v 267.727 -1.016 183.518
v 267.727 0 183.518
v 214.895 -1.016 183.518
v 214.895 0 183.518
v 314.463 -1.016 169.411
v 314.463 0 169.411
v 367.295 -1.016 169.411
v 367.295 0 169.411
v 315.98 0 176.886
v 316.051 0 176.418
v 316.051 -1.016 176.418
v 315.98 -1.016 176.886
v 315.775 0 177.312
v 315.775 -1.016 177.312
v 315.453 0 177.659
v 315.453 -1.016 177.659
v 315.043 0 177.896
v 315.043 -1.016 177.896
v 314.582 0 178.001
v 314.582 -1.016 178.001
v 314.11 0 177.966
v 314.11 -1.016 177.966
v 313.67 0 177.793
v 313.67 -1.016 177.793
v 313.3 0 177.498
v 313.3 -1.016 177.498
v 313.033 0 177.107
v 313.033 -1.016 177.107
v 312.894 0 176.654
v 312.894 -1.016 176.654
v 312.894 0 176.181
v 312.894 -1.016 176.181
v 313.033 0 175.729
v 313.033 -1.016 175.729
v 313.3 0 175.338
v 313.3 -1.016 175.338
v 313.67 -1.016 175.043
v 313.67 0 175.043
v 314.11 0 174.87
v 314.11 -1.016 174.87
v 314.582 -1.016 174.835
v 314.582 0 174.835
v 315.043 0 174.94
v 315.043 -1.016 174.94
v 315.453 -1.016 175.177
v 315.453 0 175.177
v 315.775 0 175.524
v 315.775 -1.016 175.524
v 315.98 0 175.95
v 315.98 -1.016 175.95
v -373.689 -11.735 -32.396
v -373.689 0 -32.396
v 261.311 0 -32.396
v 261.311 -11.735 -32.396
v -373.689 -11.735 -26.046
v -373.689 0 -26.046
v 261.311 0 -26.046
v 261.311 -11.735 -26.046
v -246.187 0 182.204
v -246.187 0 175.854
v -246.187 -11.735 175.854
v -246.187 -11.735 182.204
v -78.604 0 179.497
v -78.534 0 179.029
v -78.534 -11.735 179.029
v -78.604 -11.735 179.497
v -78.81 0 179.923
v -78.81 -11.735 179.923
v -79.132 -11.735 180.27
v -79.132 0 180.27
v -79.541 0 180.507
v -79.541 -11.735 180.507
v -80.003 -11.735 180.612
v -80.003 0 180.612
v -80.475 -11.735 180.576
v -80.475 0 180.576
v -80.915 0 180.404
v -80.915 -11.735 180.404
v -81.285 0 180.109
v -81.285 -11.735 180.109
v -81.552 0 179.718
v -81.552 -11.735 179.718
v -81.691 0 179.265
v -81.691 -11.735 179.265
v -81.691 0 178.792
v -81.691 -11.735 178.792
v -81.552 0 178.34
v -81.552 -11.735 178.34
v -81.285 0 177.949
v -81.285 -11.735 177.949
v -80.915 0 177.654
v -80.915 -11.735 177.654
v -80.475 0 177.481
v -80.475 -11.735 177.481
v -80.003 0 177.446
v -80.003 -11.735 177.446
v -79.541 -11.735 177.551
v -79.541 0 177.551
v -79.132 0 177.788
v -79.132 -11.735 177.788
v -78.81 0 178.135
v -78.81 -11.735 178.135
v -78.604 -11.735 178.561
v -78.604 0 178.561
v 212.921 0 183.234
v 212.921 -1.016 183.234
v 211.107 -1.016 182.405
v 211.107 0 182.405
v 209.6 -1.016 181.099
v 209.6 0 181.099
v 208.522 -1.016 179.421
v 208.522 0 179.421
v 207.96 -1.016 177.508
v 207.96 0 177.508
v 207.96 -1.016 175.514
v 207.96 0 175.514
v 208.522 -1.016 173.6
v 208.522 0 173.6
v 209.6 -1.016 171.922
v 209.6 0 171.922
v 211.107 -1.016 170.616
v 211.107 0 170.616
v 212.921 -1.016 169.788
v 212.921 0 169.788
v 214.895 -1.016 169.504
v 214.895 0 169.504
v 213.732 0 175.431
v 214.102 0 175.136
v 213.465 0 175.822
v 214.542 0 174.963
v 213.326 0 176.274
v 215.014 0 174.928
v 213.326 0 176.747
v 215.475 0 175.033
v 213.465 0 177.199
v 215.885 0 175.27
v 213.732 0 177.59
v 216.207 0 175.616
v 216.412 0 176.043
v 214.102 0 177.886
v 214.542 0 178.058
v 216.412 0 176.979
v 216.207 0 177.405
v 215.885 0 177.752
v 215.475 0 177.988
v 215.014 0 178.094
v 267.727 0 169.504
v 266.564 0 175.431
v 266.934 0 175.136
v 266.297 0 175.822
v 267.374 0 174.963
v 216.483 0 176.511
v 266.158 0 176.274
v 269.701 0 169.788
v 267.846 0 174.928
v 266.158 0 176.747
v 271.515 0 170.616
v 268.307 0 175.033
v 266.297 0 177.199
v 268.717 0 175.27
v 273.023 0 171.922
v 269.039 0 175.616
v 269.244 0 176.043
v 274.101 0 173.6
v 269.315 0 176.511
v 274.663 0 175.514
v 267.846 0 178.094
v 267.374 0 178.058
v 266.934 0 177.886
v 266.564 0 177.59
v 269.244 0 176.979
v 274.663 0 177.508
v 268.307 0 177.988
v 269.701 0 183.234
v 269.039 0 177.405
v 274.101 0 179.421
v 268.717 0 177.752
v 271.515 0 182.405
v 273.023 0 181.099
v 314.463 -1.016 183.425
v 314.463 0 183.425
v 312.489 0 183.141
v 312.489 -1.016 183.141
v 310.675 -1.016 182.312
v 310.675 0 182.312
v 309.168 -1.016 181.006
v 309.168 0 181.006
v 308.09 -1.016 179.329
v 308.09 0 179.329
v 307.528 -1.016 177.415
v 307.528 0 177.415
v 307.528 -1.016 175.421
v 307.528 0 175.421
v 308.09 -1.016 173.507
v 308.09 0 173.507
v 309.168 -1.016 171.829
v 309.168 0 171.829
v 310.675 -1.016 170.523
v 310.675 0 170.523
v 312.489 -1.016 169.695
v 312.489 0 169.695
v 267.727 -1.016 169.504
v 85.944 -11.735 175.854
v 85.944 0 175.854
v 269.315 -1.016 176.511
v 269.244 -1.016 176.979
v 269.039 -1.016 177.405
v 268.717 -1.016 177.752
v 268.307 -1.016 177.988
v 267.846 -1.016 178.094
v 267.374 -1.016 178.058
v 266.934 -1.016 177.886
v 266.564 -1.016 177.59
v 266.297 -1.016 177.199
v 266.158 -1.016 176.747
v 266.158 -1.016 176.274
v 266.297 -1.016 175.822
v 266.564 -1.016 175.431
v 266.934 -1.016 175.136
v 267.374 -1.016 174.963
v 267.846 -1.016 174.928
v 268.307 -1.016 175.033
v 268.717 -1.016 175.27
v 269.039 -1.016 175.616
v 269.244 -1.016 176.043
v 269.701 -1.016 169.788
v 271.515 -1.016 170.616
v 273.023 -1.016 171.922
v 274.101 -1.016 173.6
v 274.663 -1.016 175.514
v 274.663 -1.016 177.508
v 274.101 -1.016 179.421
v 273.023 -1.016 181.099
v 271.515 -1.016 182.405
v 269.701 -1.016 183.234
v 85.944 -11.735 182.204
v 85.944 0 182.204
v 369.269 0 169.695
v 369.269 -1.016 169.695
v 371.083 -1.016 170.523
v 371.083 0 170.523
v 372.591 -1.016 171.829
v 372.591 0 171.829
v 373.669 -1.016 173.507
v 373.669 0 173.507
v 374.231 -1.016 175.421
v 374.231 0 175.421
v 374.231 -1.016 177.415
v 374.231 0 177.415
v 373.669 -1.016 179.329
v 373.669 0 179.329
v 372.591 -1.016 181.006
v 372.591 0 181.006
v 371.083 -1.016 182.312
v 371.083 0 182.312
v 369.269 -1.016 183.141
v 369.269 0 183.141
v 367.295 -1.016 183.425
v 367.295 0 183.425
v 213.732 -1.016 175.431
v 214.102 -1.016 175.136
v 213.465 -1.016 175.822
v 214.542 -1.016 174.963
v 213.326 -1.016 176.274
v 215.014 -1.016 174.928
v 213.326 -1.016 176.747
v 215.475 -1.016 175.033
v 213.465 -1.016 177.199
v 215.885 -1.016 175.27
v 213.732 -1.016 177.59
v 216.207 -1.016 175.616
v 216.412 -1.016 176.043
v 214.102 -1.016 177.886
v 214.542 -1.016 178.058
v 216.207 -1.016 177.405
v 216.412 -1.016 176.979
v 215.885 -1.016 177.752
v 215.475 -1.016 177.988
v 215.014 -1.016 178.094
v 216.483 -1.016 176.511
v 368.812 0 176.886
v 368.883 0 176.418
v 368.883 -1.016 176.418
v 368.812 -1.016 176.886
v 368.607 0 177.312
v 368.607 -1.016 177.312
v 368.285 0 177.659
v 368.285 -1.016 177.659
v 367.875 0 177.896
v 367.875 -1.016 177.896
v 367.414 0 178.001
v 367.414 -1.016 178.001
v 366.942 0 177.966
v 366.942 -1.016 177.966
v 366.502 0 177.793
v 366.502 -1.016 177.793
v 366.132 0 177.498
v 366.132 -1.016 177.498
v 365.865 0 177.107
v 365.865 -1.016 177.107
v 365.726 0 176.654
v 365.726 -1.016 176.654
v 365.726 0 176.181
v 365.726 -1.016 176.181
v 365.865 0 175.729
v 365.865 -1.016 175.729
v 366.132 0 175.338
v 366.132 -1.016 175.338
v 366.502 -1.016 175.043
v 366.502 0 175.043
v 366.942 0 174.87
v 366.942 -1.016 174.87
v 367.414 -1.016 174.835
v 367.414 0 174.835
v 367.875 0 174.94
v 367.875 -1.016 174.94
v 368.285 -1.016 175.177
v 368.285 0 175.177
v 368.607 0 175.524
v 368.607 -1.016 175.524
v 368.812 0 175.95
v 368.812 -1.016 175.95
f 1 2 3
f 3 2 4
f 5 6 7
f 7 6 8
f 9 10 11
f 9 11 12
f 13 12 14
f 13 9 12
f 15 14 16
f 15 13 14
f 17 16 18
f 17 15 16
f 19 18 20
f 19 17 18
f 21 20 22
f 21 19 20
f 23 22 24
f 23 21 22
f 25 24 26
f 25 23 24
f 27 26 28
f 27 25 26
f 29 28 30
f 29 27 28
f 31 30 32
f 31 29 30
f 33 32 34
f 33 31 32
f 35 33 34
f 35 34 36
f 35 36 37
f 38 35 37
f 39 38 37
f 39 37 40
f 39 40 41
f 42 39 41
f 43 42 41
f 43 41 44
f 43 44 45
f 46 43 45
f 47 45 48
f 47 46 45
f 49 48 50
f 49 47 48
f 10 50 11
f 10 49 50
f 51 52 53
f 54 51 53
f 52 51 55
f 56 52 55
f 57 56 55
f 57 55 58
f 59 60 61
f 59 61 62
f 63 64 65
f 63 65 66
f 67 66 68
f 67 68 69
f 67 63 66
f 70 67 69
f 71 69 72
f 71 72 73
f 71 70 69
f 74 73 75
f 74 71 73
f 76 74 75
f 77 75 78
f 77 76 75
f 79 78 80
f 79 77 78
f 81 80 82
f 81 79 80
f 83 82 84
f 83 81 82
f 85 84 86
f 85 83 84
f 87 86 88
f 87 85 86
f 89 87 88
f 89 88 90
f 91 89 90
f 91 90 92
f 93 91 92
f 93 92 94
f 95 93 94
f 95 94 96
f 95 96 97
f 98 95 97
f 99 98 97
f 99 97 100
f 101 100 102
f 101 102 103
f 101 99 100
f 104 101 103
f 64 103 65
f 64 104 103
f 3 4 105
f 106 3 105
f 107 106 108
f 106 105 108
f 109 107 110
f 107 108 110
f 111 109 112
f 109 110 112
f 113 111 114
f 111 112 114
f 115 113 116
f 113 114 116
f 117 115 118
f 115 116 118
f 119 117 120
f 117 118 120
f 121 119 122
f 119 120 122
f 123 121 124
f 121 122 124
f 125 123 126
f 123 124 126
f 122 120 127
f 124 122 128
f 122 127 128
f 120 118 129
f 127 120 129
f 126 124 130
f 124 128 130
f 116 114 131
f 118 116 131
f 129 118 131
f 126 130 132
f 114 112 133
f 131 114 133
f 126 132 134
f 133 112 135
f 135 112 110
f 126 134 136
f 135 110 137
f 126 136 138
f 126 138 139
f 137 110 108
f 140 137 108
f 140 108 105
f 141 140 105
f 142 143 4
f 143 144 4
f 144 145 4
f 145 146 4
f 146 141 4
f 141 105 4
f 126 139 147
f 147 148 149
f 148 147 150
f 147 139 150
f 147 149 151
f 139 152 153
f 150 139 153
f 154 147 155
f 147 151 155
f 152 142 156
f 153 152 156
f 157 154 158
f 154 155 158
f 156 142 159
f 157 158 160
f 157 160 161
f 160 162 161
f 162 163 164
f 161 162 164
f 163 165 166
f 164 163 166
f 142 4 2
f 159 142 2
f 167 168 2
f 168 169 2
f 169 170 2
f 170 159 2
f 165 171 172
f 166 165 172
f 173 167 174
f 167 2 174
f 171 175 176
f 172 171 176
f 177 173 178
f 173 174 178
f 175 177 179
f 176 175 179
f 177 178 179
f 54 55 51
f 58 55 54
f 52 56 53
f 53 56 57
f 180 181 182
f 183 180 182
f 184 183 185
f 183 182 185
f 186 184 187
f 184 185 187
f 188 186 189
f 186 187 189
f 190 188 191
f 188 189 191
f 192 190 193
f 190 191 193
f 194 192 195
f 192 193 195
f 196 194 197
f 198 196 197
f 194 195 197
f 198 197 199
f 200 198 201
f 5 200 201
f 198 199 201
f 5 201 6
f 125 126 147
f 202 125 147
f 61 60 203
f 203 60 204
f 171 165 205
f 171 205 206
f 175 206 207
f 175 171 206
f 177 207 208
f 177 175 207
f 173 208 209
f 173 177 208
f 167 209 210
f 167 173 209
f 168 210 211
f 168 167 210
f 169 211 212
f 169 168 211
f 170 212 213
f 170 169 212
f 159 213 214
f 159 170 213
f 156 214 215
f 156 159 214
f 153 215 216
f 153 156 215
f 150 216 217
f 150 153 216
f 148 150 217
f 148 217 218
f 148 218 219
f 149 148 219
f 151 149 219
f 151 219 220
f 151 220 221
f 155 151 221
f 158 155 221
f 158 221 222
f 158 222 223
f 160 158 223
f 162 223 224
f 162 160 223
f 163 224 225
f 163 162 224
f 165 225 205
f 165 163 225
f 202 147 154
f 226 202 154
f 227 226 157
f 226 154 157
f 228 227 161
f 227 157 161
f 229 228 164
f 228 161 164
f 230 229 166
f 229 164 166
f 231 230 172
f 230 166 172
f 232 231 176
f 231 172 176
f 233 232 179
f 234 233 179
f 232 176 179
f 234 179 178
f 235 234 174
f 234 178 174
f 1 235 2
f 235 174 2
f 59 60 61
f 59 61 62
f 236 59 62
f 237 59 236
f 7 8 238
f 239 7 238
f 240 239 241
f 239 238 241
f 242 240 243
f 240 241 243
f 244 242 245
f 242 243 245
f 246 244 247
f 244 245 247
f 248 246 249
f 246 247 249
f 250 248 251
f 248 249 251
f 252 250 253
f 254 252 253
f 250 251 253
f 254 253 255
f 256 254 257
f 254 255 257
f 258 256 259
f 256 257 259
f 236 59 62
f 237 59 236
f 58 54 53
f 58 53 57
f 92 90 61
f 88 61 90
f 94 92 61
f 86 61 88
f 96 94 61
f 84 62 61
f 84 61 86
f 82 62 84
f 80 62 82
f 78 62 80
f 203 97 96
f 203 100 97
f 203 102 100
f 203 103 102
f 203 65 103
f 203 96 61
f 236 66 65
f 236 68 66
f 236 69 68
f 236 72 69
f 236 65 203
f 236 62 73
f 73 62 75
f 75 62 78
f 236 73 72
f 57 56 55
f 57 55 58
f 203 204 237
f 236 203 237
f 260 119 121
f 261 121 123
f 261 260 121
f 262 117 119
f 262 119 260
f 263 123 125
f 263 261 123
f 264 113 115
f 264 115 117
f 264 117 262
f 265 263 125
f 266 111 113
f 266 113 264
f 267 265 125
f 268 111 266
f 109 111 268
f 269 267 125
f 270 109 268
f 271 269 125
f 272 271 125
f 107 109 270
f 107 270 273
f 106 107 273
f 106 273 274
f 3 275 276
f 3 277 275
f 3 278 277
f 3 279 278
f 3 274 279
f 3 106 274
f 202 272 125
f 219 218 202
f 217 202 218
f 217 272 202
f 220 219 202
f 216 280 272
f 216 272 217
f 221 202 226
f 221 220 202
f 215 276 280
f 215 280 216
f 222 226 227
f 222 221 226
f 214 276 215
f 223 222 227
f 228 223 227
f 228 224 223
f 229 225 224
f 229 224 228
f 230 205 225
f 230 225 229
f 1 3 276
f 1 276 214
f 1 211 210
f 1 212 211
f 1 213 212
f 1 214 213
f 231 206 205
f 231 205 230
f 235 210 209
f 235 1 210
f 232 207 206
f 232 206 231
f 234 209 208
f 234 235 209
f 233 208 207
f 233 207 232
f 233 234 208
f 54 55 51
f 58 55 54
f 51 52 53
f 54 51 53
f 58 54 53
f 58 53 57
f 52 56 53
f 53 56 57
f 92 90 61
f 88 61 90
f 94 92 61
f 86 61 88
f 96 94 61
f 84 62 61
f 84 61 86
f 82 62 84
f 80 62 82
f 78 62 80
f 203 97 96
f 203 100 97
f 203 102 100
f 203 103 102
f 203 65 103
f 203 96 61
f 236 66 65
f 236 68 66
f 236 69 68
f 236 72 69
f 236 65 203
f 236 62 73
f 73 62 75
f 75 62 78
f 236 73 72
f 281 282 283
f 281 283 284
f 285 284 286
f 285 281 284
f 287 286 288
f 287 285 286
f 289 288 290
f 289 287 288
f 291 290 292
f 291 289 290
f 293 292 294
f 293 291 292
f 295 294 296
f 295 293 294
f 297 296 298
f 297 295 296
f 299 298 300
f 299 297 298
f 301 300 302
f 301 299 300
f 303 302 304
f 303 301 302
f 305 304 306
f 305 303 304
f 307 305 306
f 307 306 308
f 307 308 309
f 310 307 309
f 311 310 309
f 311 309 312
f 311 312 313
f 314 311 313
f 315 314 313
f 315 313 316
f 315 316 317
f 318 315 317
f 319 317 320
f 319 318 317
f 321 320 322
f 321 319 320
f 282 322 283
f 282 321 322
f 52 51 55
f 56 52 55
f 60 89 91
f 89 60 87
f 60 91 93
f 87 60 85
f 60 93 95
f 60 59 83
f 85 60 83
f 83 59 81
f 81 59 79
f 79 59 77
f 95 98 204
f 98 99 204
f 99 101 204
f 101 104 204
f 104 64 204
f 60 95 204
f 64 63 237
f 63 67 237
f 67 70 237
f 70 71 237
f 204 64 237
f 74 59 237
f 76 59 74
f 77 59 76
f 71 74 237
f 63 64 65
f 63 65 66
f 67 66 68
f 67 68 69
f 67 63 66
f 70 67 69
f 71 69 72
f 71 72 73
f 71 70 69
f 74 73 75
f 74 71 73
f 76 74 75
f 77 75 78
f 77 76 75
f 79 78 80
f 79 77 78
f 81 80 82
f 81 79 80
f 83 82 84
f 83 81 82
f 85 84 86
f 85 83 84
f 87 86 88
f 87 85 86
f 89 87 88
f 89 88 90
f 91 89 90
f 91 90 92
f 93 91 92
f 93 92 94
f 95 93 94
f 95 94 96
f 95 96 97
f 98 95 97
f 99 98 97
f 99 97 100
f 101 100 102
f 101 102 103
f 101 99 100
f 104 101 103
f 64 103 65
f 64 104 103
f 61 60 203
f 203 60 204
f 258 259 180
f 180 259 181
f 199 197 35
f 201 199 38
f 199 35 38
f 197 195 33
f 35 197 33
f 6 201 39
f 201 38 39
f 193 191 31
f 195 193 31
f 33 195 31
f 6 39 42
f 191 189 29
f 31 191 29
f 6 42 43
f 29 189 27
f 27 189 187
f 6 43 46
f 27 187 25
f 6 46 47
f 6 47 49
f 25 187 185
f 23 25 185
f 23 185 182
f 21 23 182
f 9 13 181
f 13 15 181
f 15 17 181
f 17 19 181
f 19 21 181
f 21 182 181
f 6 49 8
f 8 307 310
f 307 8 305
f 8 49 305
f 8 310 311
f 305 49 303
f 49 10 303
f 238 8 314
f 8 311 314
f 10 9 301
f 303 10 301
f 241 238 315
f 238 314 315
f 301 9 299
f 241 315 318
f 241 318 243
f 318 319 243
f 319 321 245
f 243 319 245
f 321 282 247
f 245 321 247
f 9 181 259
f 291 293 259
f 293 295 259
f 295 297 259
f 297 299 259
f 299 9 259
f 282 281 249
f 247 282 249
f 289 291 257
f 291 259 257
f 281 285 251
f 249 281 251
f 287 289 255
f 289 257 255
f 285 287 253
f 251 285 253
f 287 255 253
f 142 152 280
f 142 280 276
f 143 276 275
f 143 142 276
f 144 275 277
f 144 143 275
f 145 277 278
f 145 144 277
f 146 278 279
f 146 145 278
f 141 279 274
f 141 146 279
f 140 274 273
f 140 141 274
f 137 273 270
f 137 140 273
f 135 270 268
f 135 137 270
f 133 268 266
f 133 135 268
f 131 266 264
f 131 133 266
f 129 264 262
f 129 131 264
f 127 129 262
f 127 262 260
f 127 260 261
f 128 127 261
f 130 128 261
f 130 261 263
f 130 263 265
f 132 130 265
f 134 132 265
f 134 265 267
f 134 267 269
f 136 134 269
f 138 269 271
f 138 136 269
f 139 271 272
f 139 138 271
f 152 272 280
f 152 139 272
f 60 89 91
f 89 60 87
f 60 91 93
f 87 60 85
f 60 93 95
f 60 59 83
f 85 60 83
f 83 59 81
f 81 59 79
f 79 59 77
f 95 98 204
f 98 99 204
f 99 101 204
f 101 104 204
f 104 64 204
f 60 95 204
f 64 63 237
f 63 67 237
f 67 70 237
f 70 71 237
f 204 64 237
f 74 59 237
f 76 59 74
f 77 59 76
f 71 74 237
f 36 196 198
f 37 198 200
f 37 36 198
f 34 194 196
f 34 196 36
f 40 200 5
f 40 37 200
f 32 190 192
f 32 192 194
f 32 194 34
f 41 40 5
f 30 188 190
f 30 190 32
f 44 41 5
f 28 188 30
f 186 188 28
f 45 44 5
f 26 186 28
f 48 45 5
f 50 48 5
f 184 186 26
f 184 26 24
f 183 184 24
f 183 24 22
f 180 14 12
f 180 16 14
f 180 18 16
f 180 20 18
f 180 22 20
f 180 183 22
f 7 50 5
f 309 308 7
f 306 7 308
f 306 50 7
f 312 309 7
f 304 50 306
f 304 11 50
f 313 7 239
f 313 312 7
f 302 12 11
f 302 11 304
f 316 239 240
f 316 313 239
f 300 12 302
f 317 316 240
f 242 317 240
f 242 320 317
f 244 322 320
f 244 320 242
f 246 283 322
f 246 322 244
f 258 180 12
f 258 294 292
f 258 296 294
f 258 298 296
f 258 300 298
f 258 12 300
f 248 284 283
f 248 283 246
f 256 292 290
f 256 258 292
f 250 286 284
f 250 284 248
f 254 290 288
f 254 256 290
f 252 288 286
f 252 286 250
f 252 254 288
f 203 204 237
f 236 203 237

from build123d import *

# Parameters (mm, degrees)
F0_W     = 635
F0_H     = 6.35
F0_W_2   = 332.1304
F0_R     = 1.5875
F1_DEPTH = 11.7348
F2_DEPTH = 11.7348
F3_R     = 1.5875
F4_DEPTH = 1.016


with BuildPart() as f1:
    # F0 (on Front) → F1 (new body)
    with BuildSketch(Plane.XZ):
        with Locations((-56.189019, -29.221167)):
            Rectangle(F0_W, F0_H)
        with Locations((-80.121399, 179.028774)):
            Rectangle(F0_W_2, F0_H)
        with Locations((-80.121399, 179.028774)):
            Circle(F0_R, mode=Mode.SUBTRACT)
    extrude(amount=F1_DEPTH)


with BuildPart() as f2:
    # F0 (on Front) → F2 (new body)
    with BuildSketch(Plane.XZ):
        with Locations((-56.189019, -29.221167)):
            Rectangle(F0_W, F0_H)
        with Locations((-80.121399, 179.028774)):
            Rectangle(F0_W_2, F0_H)
        with Locations((-80.121399, 179.028774)):
            Circle(F0_R, mode=Mode.SUBTRACT)
    extrude(amount=F2_DEPTH)


with BuildPart() as f4:
    # F3 (on Front) → F4 (new body)
    with BuildSketch(Plane.XZ):
        with BuildLine():
            Line((267.727276, 183.517592), (214.895276, 183.517592))
            ThreePointArc((214.895276, 183.517592), (207.888375, 176.510692), (214.895276, 169.503791))
            Line((214.895276, 169.503791), (267.727276, 169.503791))
            ThreePointArc((267.727276, 169.503791), (274.734177, 176.510692), (267.727276, 183.517592))
        make_face()
        with Locations((214.895276, 176.510692)):
            Circle(F3_R, mode=Mode.SUBTRACT)
        with Locations((267.727276, 176.510692)):
            Circle(F3_R, mode=Mode.SUBTRACT)
        with BuildLine():
            Line((367.295276, 183.424743), (314.463276, 183.424743))
            ThreePointArc((314.463276, 183.424743), (307.456375, 176.417843), (314.463276, 169.410942))
            Line((314.463276, 169.410942), (367.295276, 169.410942))
            ThreePointArc((367.295276, 169.410942), (374.302177, 176.417843), (367.295276, 183.424743))
        make_face()
        with Locations((314.463276, 176.417843)):
            Circle(F3_R, mode=Mode.SUBTRACT)
        with Locations((367.295276, 176.417843)):
            Circle(F3_R, mode=Mode.SUBTRACT)
    extrude(amount=F4_DEPTH)


solid = Compound([f1.part, f2.part, f4.part])
